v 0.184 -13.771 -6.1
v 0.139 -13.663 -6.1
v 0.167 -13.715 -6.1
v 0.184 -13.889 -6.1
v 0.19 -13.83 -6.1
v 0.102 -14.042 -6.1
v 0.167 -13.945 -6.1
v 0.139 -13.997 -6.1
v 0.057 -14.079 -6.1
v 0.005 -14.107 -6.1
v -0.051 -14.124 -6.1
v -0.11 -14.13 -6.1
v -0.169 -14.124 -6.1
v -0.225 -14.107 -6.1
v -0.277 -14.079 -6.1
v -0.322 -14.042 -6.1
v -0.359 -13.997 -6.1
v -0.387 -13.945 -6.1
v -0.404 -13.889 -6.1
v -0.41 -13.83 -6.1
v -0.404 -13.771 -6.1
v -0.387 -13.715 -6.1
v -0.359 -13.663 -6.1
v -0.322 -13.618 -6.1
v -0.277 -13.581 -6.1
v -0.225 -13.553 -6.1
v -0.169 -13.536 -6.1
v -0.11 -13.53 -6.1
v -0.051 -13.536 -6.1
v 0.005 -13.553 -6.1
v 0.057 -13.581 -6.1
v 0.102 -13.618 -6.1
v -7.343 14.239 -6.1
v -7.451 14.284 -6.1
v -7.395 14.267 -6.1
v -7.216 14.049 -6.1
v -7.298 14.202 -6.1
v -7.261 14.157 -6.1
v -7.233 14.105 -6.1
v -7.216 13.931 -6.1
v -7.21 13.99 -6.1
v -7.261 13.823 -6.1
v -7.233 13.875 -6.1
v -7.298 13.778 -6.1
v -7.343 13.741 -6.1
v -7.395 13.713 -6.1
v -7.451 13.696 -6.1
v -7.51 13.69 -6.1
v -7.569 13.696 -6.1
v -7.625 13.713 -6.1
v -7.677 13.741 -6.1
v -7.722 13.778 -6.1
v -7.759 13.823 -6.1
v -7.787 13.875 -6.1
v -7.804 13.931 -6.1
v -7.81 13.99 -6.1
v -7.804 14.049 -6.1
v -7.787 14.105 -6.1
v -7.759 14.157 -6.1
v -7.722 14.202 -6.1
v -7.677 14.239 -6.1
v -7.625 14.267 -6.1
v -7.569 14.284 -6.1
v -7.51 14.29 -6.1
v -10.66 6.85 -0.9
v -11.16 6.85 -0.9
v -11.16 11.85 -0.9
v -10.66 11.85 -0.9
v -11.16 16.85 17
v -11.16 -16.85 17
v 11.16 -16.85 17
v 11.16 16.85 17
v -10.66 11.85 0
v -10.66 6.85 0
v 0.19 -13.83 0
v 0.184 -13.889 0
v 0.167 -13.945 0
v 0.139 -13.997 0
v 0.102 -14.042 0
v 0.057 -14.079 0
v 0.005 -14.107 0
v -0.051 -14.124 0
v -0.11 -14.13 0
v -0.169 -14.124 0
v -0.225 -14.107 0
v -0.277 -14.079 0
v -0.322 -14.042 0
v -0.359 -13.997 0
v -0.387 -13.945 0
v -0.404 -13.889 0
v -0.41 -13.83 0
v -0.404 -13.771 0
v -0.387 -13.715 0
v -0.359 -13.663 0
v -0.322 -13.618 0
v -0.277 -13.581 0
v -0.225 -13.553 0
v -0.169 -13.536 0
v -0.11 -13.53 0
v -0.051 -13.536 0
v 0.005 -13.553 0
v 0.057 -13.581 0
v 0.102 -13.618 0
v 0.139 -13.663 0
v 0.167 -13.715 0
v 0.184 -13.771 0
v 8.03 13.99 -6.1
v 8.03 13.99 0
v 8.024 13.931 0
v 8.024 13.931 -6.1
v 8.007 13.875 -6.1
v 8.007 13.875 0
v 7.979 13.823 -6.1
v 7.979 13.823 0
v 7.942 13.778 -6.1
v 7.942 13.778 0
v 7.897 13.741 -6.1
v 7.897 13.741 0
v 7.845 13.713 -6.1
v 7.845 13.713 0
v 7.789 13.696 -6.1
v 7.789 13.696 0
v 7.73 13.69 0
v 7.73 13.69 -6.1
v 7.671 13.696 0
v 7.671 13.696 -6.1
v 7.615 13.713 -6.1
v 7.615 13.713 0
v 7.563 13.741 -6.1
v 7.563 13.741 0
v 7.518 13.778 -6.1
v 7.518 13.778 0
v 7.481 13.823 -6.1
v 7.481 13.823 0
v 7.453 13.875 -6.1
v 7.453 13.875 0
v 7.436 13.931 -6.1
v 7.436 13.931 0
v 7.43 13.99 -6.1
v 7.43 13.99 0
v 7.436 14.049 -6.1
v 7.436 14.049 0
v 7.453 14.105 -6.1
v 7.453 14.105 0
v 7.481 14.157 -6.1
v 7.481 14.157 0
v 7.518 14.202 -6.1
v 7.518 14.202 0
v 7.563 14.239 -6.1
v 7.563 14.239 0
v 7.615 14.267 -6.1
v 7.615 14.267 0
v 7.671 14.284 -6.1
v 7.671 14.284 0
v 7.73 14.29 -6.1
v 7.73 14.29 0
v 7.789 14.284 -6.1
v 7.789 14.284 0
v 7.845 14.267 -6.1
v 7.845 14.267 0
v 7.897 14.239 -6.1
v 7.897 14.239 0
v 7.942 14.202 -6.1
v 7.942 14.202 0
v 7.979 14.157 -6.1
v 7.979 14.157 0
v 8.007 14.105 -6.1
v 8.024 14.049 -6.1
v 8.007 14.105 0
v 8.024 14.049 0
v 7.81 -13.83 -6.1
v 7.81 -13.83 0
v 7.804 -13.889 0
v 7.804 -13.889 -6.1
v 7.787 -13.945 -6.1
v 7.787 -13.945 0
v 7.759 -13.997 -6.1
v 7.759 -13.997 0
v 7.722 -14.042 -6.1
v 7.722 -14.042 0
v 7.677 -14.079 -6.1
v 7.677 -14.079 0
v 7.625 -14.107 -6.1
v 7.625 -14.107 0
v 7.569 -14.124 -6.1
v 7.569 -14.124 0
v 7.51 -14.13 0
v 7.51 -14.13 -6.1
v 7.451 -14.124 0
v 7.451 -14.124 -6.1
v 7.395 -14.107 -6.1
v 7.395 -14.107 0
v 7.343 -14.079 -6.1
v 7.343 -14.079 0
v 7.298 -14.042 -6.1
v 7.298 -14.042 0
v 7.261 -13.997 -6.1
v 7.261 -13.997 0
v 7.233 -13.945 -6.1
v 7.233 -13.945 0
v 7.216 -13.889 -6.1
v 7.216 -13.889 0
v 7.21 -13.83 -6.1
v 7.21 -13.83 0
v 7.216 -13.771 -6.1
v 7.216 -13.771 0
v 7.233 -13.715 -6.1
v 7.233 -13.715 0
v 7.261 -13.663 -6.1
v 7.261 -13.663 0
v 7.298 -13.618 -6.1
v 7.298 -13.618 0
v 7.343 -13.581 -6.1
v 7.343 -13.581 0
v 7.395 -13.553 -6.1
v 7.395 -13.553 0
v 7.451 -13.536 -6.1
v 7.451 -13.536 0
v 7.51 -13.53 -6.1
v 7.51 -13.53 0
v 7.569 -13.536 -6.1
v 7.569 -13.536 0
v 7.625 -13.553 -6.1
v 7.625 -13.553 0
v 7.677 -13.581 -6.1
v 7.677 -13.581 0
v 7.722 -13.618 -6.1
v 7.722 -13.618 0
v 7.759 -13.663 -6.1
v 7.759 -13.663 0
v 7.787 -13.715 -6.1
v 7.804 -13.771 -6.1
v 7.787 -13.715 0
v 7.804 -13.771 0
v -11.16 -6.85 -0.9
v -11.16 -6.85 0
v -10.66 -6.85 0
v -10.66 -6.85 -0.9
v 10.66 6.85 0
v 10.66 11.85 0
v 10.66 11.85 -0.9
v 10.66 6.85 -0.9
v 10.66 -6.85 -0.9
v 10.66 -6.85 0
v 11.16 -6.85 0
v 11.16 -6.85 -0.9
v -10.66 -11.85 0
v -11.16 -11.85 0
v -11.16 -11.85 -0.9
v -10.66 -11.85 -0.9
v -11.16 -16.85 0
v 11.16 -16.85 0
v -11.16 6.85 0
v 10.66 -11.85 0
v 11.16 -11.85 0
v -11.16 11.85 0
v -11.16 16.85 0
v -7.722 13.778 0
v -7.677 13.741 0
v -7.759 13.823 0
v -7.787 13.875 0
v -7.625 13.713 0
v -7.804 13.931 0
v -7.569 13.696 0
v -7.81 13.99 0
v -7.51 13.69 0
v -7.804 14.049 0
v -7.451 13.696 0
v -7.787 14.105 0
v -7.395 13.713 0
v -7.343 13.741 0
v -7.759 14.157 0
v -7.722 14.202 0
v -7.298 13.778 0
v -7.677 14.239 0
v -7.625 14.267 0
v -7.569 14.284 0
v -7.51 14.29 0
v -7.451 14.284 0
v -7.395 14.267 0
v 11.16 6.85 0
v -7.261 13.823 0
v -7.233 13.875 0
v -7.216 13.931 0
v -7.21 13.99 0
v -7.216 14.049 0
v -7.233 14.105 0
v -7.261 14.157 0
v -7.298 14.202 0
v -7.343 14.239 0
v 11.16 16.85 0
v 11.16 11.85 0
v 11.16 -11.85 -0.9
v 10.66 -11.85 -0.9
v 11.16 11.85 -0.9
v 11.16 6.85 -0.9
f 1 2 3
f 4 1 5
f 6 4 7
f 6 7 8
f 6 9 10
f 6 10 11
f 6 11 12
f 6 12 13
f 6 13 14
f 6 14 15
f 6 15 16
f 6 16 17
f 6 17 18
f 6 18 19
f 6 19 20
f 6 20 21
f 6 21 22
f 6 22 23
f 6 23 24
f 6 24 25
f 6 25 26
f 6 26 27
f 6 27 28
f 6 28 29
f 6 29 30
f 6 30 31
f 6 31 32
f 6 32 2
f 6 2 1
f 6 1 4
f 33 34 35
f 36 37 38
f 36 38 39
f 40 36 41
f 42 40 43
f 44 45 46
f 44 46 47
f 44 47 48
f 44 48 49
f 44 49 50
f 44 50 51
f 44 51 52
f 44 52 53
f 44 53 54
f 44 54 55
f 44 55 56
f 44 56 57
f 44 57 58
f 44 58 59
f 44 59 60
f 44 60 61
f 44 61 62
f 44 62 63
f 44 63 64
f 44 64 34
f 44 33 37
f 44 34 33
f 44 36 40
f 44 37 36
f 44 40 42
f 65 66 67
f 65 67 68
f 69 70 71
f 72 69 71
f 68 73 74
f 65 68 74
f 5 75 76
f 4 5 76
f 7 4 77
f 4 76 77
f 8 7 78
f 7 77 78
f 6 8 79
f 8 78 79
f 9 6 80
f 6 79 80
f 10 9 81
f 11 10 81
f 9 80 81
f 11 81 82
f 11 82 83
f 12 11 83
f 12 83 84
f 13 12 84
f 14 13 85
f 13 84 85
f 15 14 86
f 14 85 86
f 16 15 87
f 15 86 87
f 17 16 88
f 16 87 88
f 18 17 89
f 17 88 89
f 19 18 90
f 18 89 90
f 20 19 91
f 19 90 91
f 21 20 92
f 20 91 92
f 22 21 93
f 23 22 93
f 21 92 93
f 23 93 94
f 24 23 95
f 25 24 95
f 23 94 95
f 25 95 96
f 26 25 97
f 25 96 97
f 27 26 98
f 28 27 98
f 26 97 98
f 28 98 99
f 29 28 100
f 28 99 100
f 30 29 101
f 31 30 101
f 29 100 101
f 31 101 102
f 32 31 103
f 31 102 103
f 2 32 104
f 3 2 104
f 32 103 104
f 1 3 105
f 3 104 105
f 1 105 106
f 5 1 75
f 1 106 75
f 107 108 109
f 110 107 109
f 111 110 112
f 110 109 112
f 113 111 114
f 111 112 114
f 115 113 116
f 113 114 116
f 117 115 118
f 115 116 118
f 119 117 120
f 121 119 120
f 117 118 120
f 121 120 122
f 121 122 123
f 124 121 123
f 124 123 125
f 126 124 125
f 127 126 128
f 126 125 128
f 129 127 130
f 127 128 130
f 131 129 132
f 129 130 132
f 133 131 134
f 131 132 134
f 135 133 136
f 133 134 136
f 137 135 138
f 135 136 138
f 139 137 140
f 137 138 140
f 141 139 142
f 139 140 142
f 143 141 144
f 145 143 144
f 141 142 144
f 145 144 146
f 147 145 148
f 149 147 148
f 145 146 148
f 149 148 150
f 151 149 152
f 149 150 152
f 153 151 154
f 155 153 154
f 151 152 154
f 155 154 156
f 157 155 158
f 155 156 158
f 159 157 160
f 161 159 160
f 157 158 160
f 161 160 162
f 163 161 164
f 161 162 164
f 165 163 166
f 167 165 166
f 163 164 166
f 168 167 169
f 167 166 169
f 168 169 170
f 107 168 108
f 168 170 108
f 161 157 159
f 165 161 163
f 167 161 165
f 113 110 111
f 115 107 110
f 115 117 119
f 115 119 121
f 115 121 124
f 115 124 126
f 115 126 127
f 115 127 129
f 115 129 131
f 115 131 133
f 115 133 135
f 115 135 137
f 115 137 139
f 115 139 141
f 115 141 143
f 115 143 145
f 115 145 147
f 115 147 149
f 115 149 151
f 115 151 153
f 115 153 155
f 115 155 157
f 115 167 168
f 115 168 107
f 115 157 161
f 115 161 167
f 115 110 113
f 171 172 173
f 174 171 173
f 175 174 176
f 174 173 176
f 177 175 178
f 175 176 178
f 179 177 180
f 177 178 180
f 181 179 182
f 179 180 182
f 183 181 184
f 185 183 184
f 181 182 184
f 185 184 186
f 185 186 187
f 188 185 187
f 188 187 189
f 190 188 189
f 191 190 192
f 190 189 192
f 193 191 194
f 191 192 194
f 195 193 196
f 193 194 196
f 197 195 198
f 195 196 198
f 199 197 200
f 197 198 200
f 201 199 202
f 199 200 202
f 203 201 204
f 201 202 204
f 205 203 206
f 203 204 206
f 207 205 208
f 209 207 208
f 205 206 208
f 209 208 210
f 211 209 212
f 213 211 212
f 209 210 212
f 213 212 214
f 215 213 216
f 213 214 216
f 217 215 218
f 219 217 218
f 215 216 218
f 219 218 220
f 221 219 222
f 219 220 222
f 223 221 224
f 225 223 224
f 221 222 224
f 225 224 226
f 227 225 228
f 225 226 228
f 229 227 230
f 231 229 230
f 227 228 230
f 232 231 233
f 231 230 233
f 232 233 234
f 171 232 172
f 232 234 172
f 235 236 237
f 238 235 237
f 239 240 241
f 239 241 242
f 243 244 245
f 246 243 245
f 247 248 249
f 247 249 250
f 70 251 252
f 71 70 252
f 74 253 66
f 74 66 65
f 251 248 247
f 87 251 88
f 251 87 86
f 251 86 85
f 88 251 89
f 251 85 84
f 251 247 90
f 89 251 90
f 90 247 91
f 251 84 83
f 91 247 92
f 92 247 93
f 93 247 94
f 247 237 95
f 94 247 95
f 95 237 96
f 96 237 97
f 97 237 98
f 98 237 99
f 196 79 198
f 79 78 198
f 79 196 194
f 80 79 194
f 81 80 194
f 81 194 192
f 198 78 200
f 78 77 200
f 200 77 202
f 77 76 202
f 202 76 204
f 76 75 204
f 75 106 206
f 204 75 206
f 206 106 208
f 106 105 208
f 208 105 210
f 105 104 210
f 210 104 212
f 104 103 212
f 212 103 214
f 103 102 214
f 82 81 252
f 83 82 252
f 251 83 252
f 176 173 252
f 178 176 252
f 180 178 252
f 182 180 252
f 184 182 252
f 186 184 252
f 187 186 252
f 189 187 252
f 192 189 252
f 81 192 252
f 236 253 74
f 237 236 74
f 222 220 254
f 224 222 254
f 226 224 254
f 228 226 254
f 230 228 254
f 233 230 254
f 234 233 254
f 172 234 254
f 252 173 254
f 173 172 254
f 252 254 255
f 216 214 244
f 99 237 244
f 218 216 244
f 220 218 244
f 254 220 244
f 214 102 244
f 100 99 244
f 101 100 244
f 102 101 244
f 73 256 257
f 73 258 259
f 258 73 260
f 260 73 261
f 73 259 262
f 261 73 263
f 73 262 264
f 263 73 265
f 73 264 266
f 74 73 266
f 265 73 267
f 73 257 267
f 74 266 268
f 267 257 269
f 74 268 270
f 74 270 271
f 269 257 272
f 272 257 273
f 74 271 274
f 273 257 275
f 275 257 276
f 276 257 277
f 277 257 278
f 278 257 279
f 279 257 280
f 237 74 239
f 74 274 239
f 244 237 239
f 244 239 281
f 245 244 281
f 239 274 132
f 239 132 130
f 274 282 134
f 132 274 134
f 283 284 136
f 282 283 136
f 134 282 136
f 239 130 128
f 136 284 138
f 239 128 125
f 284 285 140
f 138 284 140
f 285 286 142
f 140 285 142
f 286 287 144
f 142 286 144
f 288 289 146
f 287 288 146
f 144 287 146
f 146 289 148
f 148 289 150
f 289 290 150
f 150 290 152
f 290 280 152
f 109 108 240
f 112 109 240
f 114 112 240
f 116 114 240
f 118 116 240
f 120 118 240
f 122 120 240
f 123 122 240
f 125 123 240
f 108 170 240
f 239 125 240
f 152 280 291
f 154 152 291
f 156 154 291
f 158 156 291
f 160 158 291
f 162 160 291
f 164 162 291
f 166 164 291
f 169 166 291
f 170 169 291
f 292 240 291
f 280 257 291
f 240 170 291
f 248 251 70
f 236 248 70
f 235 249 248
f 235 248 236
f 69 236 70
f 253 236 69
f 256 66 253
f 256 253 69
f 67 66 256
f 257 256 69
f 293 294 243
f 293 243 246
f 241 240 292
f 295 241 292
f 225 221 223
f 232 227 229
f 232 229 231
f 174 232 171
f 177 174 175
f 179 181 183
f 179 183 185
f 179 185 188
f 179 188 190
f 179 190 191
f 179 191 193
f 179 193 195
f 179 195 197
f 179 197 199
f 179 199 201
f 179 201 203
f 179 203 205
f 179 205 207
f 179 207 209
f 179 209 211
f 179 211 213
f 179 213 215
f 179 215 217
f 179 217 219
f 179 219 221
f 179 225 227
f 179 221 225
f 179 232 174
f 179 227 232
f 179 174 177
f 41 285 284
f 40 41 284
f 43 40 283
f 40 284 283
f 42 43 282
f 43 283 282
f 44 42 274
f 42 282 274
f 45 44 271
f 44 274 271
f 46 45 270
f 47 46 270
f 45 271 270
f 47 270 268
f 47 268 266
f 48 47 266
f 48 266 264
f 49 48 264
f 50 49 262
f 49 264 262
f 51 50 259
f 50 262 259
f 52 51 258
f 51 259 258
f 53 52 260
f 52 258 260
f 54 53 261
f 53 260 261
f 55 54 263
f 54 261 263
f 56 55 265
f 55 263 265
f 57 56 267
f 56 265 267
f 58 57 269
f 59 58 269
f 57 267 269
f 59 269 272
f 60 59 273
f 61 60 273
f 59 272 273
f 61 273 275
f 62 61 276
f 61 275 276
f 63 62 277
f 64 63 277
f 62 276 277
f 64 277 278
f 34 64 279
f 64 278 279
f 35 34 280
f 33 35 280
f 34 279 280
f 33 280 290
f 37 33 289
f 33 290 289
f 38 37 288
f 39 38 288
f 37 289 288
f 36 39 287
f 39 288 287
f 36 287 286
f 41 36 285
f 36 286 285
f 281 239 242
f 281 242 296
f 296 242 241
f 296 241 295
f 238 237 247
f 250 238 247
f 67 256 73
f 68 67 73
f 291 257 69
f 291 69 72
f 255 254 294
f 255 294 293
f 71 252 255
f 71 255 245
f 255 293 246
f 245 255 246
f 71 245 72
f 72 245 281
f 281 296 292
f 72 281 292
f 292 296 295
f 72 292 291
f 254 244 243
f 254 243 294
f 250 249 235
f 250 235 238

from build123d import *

# Parameters (mm, degrees)
F0_W     = 22.32
F0_H     = 33.7
F1_DEPTH = 17
F2_R     = 0.3
F3_DEPTH = 6.1
F2_W     = 0.5
F2_H     = 5
F4_DEPTH = 0.9


with BuildPart() as f1:
    # F0 (on Top) → F1 (new body)
    with BuildSketch(Plane.XY):
        Rectangle(F0_W, F0_H)
    extrude(amount=F1_DEPTH)

    # F2 (on face) → F3 (join)
    with BuildSketch(Plane(origin=(0, 0, 0), x_dir=(1, 0, 0), z_dir=(0, 0, -1))):
        with Locations((-0.11, 13.83)):
            Circle(F2_R)
        with Locations((7.51, 13.83)):
            Circle(F2_R)
        with Locations((-7.51, -13.99)):
            Circle(F2_R)
        with Locations((7.73, -13.99)):
            Circle(F2_R)
    extrude(amount=F3_DEPTH)

    # F2 (on face) → F4 (join)
    with BuildSketch(Plane(origin=(0, 0, 0), x_dir=(1, 0, 0), z_dir=(0, 0, -1))):
        with Locations((-10.91, 9.35)):
            Rectangle(F2_W, F2_H)
        with Locations((10.91, 9.35)):
            Rectangle(F2_W, F2_H)
        with Locations((-10.91, -9.35)):
            Rectangle(F2_W, F2_H)
        with Locations((10.91, -9.35)):
            Rectangle(F2_W, F2_H)
    extrude(amount=F4_DEPTH)


solid = f1.part
